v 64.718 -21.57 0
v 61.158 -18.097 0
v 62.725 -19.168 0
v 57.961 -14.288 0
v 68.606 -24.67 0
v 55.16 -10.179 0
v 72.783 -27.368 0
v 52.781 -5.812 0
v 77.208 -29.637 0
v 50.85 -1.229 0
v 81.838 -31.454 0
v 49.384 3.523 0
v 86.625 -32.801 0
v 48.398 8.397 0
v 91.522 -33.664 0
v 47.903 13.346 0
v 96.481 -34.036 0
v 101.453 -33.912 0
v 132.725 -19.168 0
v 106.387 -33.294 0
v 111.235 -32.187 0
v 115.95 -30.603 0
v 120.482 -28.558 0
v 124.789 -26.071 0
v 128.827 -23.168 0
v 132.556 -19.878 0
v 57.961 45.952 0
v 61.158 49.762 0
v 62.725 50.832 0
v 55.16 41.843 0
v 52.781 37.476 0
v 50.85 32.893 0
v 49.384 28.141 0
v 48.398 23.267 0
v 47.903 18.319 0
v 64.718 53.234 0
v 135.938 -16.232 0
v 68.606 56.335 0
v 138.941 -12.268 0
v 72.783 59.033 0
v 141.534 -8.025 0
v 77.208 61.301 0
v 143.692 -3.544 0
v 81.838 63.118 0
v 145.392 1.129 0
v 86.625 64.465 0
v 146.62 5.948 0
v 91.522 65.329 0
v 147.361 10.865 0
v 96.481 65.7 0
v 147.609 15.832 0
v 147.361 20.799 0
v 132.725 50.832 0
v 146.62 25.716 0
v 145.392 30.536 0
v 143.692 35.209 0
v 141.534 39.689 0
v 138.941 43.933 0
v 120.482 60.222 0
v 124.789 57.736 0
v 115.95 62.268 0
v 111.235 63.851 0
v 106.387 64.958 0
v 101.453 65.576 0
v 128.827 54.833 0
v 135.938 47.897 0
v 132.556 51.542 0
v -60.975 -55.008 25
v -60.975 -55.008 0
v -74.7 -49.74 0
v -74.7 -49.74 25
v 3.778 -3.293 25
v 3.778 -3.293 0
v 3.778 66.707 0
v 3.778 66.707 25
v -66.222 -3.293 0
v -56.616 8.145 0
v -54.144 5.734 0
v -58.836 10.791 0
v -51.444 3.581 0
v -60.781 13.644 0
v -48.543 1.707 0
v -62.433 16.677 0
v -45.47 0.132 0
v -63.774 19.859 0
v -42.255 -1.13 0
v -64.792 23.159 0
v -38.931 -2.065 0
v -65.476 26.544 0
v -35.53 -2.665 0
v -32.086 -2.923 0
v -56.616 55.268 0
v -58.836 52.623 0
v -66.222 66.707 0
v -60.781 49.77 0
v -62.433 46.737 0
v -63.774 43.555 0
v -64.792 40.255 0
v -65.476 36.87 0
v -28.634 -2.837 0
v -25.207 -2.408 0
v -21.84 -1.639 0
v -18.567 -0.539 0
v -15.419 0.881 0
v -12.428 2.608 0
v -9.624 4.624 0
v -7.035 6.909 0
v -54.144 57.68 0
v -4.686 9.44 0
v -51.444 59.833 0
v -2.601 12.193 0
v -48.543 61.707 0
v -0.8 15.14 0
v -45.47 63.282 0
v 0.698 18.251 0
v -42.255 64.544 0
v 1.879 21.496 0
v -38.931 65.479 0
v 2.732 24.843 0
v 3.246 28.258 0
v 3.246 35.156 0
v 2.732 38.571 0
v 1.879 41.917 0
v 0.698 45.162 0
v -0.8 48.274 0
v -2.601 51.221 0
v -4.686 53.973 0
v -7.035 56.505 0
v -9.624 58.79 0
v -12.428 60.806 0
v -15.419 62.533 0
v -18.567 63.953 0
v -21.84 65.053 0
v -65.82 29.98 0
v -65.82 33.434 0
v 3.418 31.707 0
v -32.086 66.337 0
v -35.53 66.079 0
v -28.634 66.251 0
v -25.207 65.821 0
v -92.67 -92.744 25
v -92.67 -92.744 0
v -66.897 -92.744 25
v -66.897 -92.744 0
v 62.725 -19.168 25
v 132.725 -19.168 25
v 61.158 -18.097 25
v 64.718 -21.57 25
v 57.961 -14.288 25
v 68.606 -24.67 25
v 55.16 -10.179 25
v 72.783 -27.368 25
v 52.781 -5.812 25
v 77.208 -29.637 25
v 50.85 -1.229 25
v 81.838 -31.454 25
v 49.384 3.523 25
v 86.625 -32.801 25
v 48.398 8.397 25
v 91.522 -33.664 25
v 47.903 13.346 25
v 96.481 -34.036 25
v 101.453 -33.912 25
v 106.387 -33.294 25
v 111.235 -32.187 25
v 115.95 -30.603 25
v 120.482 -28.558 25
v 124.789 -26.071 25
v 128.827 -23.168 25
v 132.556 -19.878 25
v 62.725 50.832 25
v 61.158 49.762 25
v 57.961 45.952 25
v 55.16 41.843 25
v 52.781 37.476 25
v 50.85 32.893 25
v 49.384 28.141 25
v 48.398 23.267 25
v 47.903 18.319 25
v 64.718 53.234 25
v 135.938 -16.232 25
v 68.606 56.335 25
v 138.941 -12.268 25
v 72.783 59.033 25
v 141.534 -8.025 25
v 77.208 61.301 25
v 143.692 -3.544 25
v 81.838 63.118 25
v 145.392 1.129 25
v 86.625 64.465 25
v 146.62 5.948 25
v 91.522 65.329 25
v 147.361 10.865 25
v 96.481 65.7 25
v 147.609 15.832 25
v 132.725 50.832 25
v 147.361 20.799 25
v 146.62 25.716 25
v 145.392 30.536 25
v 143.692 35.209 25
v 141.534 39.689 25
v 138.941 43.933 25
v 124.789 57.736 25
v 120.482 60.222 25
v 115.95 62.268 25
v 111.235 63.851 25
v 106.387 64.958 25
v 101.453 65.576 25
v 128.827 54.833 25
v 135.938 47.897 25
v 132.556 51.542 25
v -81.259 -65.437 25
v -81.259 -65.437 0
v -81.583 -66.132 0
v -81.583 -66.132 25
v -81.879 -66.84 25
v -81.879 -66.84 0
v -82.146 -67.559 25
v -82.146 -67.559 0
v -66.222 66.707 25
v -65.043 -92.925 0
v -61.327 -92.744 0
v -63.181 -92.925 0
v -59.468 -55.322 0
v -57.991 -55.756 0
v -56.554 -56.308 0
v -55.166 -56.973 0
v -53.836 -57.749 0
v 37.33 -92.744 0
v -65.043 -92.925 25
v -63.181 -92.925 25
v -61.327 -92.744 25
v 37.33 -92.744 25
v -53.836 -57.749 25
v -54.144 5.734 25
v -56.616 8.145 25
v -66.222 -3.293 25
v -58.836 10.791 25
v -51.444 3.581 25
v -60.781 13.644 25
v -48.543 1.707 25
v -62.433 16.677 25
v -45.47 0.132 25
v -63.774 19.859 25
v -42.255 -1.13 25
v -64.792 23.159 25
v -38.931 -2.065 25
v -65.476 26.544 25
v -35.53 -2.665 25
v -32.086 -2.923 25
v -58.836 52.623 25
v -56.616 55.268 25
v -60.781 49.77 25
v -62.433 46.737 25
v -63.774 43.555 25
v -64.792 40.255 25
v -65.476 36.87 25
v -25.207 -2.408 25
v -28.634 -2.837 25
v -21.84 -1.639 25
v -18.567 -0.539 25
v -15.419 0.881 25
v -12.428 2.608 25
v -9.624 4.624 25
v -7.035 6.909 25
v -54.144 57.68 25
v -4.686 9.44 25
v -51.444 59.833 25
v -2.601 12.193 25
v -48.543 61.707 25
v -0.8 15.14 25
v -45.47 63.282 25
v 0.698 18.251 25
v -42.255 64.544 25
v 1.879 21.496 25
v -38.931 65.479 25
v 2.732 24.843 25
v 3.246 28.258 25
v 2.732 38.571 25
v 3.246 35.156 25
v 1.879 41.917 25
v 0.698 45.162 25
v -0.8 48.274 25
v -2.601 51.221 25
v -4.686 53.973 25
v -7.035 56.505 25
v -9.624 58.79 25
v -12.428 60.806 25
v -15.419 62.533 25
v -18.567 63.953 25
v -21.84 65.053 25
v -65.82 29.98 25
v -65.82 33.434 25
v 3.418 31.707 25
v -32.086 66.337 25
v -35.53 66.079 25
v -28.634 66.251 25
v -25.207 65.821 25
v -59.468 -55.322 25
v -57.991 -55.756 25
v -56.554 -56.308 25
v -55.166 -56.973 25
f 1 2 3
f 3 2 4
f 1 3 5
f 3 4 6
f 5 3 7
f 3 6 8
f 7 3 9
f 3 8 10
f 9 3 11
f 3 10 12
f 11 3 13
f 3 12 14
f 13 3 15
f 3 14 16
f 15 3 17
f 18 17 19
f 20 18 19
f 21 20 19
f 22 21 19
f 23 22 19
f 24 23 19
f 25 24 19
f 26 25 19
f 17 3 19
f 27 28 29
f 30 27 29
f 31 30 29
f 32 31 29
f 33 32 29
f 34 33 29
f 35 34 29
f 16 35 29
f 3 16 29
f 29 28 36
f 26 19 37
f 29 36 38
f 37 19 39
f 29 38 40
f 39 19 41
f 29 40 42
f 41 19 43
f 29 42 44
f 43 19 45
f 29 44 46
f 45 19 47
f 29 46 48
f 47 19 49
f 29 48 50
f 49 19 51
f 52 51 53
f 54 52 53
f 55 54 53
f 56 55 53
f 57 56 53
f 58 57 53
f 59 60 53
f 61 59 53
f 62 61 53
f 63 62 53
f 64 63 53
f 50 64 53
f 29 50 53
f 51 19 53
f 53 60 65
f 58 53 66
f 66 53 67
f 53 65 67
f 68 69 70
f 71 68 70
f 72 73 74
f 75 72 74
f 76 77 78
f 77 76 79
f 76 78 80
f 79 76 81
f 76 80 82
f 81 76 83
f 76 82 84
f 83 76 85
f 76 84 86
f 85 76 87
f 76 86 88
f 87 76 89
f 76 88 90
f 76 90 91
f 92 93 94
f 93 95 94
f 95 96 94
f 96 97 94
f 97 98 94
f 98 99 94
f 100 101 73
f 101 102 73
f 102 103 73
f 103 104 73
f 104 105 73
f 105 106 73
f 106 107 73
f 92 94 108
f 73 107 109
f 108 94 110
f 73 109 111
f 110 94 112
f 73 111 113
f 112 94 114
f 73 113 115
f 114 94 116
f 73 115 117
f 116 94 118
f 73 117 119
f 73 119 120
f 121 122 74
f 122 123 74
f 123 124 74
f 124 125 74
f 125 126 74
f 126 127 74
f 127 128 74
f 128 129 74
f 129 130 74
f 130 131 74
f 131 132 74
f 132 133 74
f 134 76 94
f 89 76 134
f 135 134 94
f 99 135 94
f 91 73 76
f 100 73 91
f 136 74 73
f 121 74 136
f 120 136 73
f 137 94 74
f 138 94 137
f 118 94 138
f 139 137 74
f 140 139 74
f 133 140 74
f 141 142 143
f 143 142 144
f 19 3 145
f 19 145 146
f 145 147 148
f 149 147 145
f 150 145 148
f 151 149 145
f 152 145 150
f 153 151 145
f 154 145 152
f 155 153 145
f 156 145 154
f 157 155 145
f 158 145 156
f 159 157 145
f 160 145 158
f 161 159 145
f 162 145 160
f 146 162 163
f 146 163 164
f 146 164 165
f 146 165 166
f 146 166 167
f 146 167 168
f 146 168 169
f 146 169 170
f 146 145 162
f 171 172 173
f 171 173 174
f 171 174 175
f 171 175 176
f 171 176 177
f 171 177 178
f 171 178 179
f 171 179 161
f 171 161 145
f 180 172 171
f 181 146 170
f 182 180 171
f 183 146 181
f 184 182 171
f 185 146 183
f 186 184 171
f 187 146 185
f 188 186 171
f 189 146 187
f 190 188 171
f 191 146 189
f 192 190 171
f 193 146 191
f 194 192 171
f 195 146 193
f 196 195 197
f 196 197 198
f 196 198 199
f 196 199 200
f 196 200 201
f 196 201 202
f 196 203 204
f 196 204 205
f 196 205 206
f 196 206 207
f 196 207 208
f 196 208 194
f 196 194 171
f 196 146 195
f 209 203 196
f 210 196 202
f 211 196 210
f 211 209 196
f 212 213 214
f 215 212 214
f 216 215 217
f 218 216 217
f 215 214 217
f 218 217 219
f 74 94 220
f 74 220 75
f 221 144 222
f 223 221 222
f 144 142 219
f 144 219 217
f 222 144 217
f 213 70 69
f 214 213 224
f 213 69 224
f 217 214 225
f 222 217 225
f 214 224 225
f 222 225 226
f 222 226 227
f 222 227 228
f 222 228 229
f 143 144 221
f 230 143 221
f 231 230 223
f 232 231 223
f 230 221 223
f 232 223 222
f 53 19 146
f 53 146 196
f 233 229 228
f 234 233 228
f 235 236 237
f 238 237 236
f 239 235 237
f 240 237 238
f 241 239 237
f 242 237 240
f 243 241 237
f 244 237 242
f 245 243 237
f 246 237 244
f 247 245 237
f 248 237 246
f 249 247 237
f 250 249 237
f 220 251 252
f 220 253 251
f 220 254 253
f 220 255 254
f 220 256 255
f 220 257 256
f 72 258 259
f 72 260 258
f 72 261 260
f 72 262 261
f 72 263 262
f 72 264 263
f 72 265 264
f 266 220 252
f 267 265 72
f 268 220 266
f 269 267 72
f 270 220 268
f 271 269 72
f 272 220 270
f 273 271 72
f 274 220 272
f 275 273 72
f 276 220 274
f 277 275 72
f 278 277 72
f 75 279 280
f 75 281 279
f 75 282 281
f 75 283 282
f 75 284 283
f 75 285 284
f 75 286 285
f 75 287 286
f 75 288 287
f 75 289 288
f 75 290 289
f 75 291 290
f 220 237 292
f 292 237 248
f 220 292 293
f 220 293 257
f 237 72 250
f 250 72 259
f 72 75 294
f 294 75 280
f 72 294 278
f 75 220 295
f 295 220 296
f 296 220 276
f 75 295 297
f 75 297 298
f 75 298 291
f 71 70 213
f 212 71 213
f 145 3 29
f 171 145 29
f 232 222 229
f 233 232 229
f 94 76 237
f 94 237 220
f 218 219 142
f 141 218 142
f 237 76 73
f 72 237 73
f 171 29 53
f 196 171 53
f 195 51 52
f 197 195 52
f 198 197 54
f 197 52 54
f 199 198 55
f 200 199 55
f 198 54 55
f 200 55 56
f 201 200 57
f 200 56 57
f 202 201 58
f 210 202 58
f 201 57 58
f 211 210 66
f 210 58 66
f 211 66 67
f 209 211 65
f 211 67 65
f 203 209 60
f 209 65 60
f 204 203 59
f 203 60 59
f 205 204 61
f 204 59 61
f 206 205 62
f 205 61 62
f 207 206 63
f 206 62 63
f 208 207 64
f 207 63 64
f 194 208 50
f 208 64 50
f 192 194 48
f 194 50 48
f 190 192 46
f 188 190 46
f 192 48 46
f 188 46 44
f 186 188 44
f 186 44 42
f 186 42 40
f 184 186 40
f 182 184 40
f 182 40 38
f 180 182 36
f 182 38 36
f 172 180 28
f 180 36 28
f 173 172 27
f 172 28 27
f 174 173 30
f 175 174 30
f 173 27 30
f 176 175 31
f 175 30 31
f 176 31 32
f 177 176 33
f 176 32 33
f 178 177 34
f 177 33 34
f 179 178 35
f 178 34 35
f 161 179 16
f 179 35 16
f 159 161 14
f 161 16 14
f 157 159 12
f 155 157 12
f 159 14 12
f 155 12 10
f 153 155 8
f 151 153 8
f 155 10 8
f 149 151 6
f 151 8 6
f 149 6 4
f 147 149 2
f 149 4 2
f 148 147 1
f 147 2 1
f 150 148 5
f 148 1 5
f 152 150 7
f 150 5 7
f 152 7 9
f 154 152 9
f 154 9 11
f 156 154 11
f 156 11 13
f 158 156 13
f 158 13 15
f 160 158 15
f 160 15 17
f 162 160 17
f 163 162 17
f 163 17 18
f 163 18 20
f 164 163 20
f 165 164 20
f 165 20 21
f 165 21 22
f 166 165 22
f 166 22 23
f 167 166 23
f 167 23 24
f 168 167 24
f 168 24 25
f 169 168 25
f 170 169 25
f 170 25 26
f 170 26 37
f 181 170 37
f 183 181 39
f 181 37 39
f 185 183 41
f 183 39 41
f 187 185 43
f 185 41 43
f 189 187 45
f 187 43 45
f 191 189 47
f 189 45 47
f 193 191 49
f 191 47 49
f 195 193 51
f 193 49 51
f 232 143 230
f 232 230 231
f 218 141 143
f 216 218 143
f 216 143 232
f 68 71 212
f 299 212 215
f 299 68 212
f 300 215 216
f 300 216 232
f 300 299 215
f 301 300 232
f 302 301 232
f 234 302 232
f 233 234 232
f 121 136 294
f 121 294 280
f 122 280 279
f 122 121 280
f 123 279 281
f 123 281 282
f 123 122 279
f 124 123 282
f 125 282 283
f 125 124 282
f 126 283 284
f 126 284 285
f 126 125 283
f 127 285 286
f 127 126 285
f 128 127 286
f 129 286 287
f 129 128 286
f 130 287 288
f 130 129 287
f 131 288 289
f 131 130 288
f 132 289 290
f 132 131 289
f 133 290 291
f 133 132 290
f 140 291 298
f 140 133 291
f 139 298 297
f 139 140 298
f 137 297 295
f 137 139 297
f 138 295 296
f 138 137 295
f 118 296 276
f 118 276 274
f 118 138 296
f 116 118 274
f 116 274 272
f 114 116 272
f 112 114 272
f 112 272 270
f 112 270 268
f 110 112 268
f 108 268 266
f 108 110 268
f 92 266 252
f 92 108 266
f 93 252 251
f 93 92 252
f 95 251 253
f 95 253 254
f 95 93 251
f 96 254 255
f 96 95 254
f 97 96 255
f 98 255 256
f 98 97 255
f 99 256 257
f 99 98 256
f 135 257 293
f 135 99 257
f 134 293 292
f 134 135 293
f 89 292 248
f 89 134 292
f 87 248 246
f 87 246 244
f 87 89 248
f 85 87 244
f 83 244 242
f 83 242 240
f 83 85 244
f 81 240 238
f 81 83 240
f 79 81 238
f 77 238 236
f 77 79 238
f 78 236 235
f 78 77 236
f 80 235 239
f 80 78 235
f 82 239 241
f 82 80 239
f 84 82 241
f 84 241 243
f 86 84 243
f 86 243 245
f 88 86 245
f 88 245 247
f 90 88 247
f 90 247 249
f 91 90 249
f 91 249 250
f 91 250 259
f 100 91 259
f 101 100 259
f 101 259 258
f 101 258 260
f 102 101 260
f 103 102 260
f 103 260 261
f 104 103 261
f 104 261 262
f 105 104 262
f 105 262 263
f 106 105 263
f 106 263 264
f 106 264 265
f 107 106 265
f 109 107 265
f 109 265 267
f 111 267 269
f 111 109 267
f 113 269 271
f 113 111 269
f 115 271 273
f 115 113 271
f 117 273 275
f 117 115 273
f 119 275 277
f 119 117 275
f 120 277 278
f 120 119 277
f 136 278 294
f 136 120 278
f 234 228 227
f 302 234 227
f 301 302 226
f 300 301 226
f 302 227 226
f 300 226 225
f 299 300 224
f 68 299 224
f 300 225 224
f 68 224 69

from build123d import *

# Parameters (mm, degrees)
F0_W     = 70
F0_H     = 70
F0_R     = 34.6406955074
F1_DEPTH = 25
F0_R_2   = 49.8837049023


with BuildPart() as f1:
    # F0 (on Top) → F1 (new body)
    with BuildSketch(Plane.XY):
        with Locations((-31.2223267555, 31.7068226919)):
            Rectangle(F0_W, F0_H)
        with Locations((-31.2223267555, 31.7068226919)):
            Circle(F0_R, mode=Mode.SUBTRACT)
    extrude(amount=F1_DEPTH)


with BuildPart() as f1b:
    # F0 (on Top) → F1, piece 2 (new body)
    with BuildSketch(Plane.XY):
        with Locations((97.7249628305, 15.8321800083)):
            Circle(F0_R_2)
        with Locations((97.7249628305, 15.8321800083)):
            Rectangle(F0_W, F0_H, mode=Mode.SUBTRACT)
    extrude(amount=F1_DEPTH)


with BuildPart() as f1c:
    # F0 (on Top) → F1, piece 3 (new body)
    with BuildSketch(Plane.XY):
        with BuildLine():
            Line((-61.3269406594, -92.743806541), (-59.4139359891, -92.743806541))
            Line((-59.4139359891, -92.743806541), (37.3297232389, -92.743806541))
            Line((37.3297232389, -92.743806541), (-53.8359624566, -57.7485785731))
            ThreePointArc((-53.8359624566, -57.7485785731), (-47.3627732226, -64.6687190479), (-45.0121854903, -73.8483301704))
            ThreePointArc((-45.0121854903, -73.8483301704), (-49.6552278172, -86.3304199744), (-61.3269406594, -92.743806541))
        make_face()
        with BuildLine():
            ThreePointArc((-66.896609962, -92.743806541), (-64.1117753107, -92.9479199908), (-61.3269406594, -92.743806541))
            Line((-61.3269406594, -92.743806541), (-66.896609962, -92.743806541))
        make_face()
        with BuildLine():
            Line((-66.896609962, -92.743806541), (-61.3269406594, -92.743806541))
            ThreePointArc((-61.3269406594, -92.743806541), (-49.6552278172, -86.3304199744), (-45.0121854903, -73.8483301704))
            ThreePointArc((-45.0121854903, -73.8483301704), (-47.3627732226, -64.6687190479), (-53.8359624566, -57.7485785731))
            Line((-53.8359624566, -57.7485785731), (-60.9753559123, -55.0080221935))
            ThreePointArc((-60.9753559123, -55.0080221935), (-72.8448389452, -56.8622202313), (-81.259281641, -65.4365908759))
            Line((-81.259281641, -65.4365908759), (-82.1459824964, -67.5585207544))
            ThreePointArc((-82.1459824964, -67.5585207544), (-80.4498529452, -83.7408298805), (-66.896609962, -92.743806541))
        make_face()
        with BuildLine():
            Line((-60.9753559123, -55.0080221935), (-53.8359624566, -57.7485785731))
            ThreePointArc((-53.8359624566, -57.7485785731), (-57.2670944696, -56.01732696), (-60.9753559123, -55.0080221935))
        make_face()
        with BuildLine():
            Line((-92.6702767611, -92.743806541), (-66.896609962, -92.743806541))
            ThreePointArc((-66.896609962, -92.743806541), (-80.4498529452, -83.7408298805), (-82.1459824964, -67.5585207544))
            Line((-82.1459824964, -67.5585207544), (-92.6702767611, -92.743806541))
        make_face()
        with BuildLine():
            ThreePointArc((-81.259281641, -65.4365908759), (-72.8448389452, -56.8622202313), (-60.9753559123, -55.0080221935))
            Line((-60.9753559123, -55.0080221935), (-74.6999279407, -49.7396525955))
            Line((-74.6999279407, -49.7396525955), (-81.259281641, -65.4365908759))
        make_face()
        with BuildLine():
            ThreePointArc((-81.259281641, -65.4365908759), (-81.7345982424, -66.4841979592), (-82.1459824964, -67.5585207544))
            Line((-82.1459824964, -67.5585207544), (-81.259281641, -65.4365908759))
        make_face()
    extrude(amount=F1_DEPTH)


solid = Compound([f1.part, f1b.part, f1c.part])
